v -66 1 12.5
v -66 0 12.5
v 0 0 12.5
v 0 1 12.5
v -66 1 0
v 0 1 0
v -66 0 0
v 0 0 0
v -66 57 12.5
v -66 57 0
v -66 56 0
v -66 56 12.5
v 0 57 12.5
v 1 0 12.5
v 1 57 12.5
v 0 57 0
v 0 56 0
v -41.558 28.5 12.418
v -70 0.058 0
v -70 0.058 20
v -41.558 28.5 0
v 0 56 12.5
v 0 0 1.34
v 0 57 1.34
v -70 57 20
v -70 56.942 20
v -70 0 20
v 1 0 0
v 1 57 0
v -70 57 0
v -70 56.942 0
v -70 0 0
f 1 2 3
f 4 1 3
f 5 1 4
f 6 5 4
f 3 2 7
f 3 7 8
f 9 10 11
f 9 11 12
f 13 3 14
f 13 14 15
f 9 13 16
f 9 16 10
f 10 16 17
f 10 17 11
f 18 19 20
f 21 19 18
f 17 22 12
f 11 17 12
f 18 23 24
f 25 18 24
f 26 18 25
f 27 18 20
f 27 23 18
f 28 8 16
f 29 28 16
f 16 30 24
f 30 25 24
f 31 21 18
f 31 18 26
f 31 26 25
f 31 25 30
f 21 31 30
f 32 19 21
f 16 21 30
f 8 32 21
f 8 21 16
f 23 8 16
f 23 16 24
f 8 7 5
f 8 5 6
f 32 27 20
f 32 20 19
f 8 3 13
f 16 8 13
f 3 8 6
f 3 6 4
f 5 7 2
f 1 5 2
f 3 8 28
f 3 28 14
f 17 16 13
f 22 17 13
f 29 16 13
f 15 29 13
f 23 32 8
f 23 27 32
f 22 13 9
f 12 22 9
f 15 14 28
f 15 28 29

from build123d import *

# Parameters (mm, degrees)
F1_DEPTH  = 57
F2_W      = 57
F2_H      = 12.5
F3_DEPTH  = 1
F4_W      = 66
F4_H      = 12.5
F5_DEPTH  = 1
F7_W      = 66
F7_H      = 12.5
F8_DEPTH  = 1
F10_DEPTH = 25


# Not quite as in the source:
# - a feature names something its author has since deleted; it is built from what else it names


with BuildPart() as f1:
    # F0 (on Front) → F1 (new body)
    with BuildSketch(Plane.XZ):
        Polygon((-70, 0), (0, 0), (0, 1.33974), (-70, 20), align=None)
    extrude(amount=-F1_DEPTH)

    # F9 (on Top) → F10 (cut)
    with BuildSketch(Plane.XY):
        Polygon((-70.0584907394, 57), (-70.0584907394, 0), (-41.5584907394, 28.5), align=None)
    extrude(amount=F10_DEPTH, mode=Mode.SUBTRACT)


with BuildPart() as f3:
    # F2 (on Right) → F3 (new body)
    with BuildSketch(Plane.YZ):
        with Locations((28.5, 6.25)):
            Rectangle(F2_W, F2_H)
    extrude(amount=F3_DEPTH)


with BuildPart() as f5:
    # F4 (on Front) → F5 (new body)
    with BuildSketch(Plane.XZ):
        with Locations((-33, 6.25)):
            Rectangle(F4_W, F4_H)
    extrude(amount=-F5_DEPTH)


with BuildPart() as f8:
    # F7 (on offset) → F8 (new body)
    with BuildSketch(Plane(origin=(0, 57, 0), x_dir=(-1, 0, 0), z_dir=(0, 1, 0))):
        with Locations((33, 6.25)):
            Rectangle(F7_W, F7_H)
    extrude(amount=-F8_DEPTH)


solid = Compound([f1.part, f3.part, f5.part, f8.part])
